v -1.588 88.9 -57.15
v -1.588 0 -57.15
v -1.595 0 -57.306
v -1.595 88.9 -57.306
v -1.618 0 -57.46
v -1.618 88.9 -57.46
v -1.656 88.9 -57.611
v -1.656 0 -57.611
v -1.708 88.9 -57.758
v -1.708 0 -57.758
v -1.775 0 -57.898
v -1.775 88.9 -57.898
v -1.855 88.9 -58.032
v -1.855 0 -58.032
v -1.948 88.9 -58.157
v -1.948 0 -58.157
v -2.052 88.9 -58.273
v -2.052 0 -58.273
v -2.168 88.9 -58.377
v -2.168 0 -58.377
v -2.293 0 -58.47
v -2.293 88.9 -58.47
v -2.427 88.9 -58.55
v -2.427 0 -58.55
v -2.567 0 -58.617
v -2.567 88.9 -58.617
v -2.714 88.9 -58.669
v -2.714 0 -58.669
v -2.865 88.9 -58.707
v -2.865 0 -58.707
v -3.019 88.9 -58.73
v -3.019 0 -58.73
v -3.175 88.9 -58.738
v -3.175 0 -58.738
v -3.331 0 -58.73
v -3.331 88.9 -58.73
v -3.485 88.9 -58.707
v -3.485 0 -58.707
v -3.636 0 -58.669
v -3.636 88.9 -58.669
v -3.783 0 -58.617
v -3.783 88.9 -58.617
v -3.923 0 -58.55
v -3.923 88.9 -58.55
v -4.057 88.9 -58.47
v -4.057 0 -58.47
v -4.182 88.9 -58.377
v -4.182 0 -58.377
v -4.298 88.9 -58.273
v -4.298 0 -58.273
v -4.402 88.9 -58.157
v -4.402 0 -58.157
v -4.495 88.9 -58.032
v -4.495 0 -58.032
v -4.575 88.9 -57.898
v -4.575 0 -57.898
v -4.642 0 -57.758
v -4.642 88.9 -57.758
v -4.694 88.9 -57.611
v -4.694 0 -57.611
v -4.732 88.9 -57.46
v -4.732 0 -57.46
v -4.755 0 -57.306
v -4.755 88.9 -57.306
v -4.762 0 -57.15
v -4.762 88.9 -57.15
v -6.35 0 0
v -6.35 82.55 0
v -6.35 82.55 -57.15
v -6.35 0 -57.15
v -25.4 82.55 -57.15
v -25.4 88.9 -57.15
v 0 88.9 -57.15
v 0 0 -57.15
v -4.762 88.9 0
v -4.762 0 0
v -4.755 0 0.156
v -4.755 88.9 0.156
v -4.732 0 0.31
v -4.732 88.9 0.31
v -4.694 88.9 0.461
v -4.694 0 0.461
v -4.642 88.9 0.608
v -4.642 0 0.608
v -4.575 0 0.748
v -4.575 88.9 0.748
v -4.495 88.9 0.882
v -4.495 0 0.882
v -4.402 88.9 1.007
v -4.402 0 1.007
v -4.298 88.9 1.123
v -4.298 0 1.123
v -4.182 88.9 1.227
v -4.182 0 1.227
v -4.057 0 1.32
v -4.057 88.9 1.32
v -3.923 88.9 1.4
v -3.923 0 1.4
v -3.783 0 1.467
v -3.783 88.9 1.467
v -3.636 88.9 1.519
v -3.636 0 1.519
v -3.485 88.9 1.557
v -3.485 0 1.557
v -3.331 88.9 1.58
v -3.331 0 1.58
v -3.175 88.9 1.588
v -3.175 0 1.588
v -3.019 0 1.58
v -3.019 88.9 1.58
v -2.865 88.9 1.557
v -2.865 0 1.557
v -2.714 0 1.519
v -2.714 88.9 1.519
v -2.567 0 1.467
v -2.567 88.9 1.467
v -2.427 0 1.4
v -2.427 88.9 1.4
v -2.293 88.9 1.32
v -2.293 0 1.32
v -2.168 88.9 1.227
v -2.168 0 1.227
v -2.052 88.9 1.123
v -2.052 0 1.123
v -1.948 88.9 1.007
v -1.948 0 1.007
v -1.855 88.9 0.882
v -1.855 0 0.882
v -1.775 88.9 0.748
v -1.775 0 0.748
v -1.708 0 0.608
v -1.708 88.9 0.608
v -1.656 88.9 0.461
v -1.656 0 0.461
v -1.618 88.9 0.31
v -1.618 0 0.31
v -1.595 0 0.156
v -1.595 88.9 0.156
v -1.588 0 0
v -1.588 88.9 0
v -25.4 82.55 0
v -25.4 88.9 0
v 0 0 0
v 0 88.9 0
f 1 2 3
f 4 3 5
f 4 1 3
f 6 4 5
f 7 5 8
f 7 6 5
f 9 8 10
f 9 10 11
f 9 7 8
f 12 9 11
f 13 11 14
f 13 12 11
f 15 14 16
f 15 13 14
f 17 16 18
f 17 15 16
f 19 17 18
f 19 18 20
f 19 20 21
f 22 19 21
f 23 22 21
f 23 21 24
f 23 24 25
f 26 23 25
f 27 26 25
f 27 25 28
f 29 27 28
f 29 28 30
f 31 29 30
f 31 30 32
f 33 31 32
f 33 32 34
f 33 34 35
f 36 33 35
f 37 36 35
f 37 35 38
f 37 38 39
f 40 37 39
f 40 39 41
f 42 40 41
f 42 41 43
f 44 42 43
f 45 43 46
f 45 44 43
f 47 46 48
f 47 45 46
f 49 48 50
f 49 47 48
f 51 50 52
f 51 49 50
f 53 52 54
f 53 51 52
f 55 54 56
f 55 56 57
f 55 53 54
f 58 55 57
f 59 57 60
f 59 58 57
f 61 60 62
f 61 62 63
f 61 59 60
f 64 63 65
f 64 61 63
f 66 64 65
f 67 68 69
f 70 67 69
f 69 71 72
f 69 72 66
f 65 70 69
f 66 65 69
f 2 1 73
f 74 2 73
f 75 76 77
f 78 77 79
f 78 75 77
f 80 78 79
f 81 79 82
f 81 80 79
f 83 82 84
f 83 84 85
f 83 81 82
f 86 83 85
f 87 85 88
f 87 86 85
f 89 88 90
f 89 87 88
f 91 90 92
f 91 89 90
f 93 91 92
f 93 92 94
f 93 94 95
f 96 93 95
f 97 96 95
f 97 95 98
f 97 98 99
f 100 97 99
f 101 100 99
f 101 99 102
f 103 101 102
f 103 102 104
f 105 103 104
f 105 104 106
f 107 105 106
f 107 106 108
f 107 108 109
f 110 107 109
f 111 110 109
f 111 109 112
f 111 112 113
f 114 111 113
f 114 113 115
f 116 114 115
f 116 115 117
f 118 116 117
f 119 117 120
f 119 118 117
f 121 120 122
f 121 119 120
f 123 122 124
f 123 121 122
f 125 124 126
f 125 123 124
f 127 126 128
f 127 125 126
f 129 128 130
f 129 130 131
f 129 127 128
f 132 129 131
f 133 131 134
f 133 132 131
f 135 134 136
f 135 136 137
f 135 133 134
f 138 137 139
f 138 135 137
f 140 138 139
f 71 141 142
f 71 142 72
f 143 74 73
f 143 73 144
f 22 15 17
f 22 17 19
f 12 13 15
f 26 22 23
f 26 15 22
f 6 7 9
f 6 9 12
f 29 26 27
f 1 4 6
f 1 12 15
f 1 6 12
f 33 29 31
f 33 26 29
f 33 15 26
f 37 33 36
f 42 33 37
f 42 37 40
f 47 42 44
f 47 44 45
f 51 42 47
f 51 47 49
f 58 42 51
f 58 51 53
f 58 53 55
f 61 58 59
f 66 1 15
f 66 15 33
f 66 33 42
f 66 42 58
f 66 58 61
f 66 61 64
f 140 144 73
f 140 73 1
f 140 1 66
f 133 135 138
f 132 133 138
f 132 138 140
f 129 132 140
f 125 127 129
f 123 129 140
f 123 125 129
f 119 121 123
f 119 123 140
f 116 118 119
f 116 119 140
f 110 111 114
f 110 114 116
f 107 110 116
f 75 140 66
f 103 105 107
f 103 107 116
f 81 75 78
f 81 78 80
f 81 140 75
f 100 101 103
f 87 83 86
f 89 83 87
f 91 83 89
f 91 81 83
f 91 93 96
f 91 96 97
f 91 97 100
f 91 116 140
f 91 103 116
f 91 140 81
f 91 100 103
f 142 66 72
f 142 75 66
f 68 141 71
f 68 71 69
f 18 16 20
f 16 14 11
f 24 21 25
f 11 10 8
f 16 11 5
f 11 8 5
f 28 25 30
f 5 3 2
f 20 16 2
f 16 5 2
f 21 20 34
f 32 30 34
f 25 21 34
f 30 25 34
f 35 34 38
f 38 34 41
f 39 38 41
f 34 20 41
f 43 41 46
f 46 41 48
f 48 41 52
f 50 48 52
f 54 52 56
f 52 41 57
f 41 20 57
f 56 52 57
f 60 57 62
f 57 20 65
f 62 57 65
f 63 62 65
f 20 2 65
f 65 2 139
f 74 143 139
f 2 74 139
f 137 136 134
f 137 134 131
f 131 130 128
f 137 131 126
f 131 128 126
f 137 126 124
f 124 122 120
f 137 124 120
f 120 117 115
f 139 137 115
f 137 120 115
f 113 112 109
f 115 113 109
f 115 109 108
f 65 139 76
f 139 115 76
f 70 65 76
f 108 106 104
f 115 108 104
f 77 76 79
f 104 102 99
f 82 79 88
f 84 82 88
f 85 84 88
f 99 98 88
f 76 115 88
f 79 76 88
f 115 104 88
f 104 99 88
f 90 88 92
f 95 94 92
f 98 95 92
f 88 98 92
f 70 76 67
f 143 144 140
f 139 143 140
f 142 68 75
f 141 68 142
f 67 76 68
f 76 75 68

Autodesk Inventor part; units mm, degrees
ref_plane "YZ Plane" through (0, 0, 0) normal (1, 0, 0) x (0, 1, 0)
ref_plane "XZ Plane" through (0, 0, 0) normal (0, 1, 0) x (-1, 0, 0)
ref_plane "XY Plane" through (0, 0, 0) normal (0, 0, 1) x (1, 0, 0)
sketch "Sketch1" plane through (0, 0, 0) normal (0, 1, 0) x (-1, 0, 0)
  line L0 (0, 0) -> (25.4, 0)
  line L1 (25.4, 0) -> (25.4, -57.15)
  line L2 (25.4, -57.15) -> (0, -57.15)
  line L3 (0, -57.15) -> (0, 0)
  dimension "d0" = 25.4
  dimension "d1" = 57.15
extrude "Extrusion1" add sketch "Sketch1" along normal blind 88.9
sketch "Sketch2" plane through (0, 0, 0) normal (0, -1, 0) x (1, 0, 0)
  line L0 (0, 0) -> (-6.35, 0)
  line L1 (-25.4, 0) -> (0, 0) projected
  line L2 (-6.35, 0) -> (-6.35, -57.15)
  line L3 (0, -57.15) -> (-25.4, -57.15) projected
  line L4 (-6.35, 0) -> (-25.4, 0)
  line L5 (-25.4, -57.15) -> (-25.4, 0) projected
  line L6 (-25.4, -57.15) -> (-25.4, 0)
  line L7 (-25.4, -57.15) -> (-6.35, -57.15)
  dimension "d4" = 6.35
extrude "Extrusion2" cut sketch "Sketch2" against normal blind 82.55
sketch "Sketch3" plane through (0, 88.9, 0) normal (0, 1, 0) x (1, 0, 0)
  line L0 (0, 0) -> (0, 57.15) projected
  line L1 (0, 57.15) -> (-3.175, 57.15)
  line L2 (-6.35, 57.15) -> (0, 57.15) projected
  arc A0 (-1.5875, 57.15) -> (-4.7625, 57.15) centre (-3.175, 57.15) ccw
  line L3 (-4.7625, 57.15) -> (0, 57.15)
  arc A1 (-4.7625, 0) -> (-1.5875, 0) centre (-3.175, 0) ccw
  line L4 (-4.7625, 0) -> (-1.5875, 0)
  line L5 (0, 0) -> (-3.175, 0)
  dimension "d12" = 3.175
  dimension "d13" = 3.175
  dimension "d17" = 3.175
  dimension "d18" = 3.175
extrude "Extrusion3" add sketch "Sketch3" against normal blind 88.9
properties part number "arduinocase"
